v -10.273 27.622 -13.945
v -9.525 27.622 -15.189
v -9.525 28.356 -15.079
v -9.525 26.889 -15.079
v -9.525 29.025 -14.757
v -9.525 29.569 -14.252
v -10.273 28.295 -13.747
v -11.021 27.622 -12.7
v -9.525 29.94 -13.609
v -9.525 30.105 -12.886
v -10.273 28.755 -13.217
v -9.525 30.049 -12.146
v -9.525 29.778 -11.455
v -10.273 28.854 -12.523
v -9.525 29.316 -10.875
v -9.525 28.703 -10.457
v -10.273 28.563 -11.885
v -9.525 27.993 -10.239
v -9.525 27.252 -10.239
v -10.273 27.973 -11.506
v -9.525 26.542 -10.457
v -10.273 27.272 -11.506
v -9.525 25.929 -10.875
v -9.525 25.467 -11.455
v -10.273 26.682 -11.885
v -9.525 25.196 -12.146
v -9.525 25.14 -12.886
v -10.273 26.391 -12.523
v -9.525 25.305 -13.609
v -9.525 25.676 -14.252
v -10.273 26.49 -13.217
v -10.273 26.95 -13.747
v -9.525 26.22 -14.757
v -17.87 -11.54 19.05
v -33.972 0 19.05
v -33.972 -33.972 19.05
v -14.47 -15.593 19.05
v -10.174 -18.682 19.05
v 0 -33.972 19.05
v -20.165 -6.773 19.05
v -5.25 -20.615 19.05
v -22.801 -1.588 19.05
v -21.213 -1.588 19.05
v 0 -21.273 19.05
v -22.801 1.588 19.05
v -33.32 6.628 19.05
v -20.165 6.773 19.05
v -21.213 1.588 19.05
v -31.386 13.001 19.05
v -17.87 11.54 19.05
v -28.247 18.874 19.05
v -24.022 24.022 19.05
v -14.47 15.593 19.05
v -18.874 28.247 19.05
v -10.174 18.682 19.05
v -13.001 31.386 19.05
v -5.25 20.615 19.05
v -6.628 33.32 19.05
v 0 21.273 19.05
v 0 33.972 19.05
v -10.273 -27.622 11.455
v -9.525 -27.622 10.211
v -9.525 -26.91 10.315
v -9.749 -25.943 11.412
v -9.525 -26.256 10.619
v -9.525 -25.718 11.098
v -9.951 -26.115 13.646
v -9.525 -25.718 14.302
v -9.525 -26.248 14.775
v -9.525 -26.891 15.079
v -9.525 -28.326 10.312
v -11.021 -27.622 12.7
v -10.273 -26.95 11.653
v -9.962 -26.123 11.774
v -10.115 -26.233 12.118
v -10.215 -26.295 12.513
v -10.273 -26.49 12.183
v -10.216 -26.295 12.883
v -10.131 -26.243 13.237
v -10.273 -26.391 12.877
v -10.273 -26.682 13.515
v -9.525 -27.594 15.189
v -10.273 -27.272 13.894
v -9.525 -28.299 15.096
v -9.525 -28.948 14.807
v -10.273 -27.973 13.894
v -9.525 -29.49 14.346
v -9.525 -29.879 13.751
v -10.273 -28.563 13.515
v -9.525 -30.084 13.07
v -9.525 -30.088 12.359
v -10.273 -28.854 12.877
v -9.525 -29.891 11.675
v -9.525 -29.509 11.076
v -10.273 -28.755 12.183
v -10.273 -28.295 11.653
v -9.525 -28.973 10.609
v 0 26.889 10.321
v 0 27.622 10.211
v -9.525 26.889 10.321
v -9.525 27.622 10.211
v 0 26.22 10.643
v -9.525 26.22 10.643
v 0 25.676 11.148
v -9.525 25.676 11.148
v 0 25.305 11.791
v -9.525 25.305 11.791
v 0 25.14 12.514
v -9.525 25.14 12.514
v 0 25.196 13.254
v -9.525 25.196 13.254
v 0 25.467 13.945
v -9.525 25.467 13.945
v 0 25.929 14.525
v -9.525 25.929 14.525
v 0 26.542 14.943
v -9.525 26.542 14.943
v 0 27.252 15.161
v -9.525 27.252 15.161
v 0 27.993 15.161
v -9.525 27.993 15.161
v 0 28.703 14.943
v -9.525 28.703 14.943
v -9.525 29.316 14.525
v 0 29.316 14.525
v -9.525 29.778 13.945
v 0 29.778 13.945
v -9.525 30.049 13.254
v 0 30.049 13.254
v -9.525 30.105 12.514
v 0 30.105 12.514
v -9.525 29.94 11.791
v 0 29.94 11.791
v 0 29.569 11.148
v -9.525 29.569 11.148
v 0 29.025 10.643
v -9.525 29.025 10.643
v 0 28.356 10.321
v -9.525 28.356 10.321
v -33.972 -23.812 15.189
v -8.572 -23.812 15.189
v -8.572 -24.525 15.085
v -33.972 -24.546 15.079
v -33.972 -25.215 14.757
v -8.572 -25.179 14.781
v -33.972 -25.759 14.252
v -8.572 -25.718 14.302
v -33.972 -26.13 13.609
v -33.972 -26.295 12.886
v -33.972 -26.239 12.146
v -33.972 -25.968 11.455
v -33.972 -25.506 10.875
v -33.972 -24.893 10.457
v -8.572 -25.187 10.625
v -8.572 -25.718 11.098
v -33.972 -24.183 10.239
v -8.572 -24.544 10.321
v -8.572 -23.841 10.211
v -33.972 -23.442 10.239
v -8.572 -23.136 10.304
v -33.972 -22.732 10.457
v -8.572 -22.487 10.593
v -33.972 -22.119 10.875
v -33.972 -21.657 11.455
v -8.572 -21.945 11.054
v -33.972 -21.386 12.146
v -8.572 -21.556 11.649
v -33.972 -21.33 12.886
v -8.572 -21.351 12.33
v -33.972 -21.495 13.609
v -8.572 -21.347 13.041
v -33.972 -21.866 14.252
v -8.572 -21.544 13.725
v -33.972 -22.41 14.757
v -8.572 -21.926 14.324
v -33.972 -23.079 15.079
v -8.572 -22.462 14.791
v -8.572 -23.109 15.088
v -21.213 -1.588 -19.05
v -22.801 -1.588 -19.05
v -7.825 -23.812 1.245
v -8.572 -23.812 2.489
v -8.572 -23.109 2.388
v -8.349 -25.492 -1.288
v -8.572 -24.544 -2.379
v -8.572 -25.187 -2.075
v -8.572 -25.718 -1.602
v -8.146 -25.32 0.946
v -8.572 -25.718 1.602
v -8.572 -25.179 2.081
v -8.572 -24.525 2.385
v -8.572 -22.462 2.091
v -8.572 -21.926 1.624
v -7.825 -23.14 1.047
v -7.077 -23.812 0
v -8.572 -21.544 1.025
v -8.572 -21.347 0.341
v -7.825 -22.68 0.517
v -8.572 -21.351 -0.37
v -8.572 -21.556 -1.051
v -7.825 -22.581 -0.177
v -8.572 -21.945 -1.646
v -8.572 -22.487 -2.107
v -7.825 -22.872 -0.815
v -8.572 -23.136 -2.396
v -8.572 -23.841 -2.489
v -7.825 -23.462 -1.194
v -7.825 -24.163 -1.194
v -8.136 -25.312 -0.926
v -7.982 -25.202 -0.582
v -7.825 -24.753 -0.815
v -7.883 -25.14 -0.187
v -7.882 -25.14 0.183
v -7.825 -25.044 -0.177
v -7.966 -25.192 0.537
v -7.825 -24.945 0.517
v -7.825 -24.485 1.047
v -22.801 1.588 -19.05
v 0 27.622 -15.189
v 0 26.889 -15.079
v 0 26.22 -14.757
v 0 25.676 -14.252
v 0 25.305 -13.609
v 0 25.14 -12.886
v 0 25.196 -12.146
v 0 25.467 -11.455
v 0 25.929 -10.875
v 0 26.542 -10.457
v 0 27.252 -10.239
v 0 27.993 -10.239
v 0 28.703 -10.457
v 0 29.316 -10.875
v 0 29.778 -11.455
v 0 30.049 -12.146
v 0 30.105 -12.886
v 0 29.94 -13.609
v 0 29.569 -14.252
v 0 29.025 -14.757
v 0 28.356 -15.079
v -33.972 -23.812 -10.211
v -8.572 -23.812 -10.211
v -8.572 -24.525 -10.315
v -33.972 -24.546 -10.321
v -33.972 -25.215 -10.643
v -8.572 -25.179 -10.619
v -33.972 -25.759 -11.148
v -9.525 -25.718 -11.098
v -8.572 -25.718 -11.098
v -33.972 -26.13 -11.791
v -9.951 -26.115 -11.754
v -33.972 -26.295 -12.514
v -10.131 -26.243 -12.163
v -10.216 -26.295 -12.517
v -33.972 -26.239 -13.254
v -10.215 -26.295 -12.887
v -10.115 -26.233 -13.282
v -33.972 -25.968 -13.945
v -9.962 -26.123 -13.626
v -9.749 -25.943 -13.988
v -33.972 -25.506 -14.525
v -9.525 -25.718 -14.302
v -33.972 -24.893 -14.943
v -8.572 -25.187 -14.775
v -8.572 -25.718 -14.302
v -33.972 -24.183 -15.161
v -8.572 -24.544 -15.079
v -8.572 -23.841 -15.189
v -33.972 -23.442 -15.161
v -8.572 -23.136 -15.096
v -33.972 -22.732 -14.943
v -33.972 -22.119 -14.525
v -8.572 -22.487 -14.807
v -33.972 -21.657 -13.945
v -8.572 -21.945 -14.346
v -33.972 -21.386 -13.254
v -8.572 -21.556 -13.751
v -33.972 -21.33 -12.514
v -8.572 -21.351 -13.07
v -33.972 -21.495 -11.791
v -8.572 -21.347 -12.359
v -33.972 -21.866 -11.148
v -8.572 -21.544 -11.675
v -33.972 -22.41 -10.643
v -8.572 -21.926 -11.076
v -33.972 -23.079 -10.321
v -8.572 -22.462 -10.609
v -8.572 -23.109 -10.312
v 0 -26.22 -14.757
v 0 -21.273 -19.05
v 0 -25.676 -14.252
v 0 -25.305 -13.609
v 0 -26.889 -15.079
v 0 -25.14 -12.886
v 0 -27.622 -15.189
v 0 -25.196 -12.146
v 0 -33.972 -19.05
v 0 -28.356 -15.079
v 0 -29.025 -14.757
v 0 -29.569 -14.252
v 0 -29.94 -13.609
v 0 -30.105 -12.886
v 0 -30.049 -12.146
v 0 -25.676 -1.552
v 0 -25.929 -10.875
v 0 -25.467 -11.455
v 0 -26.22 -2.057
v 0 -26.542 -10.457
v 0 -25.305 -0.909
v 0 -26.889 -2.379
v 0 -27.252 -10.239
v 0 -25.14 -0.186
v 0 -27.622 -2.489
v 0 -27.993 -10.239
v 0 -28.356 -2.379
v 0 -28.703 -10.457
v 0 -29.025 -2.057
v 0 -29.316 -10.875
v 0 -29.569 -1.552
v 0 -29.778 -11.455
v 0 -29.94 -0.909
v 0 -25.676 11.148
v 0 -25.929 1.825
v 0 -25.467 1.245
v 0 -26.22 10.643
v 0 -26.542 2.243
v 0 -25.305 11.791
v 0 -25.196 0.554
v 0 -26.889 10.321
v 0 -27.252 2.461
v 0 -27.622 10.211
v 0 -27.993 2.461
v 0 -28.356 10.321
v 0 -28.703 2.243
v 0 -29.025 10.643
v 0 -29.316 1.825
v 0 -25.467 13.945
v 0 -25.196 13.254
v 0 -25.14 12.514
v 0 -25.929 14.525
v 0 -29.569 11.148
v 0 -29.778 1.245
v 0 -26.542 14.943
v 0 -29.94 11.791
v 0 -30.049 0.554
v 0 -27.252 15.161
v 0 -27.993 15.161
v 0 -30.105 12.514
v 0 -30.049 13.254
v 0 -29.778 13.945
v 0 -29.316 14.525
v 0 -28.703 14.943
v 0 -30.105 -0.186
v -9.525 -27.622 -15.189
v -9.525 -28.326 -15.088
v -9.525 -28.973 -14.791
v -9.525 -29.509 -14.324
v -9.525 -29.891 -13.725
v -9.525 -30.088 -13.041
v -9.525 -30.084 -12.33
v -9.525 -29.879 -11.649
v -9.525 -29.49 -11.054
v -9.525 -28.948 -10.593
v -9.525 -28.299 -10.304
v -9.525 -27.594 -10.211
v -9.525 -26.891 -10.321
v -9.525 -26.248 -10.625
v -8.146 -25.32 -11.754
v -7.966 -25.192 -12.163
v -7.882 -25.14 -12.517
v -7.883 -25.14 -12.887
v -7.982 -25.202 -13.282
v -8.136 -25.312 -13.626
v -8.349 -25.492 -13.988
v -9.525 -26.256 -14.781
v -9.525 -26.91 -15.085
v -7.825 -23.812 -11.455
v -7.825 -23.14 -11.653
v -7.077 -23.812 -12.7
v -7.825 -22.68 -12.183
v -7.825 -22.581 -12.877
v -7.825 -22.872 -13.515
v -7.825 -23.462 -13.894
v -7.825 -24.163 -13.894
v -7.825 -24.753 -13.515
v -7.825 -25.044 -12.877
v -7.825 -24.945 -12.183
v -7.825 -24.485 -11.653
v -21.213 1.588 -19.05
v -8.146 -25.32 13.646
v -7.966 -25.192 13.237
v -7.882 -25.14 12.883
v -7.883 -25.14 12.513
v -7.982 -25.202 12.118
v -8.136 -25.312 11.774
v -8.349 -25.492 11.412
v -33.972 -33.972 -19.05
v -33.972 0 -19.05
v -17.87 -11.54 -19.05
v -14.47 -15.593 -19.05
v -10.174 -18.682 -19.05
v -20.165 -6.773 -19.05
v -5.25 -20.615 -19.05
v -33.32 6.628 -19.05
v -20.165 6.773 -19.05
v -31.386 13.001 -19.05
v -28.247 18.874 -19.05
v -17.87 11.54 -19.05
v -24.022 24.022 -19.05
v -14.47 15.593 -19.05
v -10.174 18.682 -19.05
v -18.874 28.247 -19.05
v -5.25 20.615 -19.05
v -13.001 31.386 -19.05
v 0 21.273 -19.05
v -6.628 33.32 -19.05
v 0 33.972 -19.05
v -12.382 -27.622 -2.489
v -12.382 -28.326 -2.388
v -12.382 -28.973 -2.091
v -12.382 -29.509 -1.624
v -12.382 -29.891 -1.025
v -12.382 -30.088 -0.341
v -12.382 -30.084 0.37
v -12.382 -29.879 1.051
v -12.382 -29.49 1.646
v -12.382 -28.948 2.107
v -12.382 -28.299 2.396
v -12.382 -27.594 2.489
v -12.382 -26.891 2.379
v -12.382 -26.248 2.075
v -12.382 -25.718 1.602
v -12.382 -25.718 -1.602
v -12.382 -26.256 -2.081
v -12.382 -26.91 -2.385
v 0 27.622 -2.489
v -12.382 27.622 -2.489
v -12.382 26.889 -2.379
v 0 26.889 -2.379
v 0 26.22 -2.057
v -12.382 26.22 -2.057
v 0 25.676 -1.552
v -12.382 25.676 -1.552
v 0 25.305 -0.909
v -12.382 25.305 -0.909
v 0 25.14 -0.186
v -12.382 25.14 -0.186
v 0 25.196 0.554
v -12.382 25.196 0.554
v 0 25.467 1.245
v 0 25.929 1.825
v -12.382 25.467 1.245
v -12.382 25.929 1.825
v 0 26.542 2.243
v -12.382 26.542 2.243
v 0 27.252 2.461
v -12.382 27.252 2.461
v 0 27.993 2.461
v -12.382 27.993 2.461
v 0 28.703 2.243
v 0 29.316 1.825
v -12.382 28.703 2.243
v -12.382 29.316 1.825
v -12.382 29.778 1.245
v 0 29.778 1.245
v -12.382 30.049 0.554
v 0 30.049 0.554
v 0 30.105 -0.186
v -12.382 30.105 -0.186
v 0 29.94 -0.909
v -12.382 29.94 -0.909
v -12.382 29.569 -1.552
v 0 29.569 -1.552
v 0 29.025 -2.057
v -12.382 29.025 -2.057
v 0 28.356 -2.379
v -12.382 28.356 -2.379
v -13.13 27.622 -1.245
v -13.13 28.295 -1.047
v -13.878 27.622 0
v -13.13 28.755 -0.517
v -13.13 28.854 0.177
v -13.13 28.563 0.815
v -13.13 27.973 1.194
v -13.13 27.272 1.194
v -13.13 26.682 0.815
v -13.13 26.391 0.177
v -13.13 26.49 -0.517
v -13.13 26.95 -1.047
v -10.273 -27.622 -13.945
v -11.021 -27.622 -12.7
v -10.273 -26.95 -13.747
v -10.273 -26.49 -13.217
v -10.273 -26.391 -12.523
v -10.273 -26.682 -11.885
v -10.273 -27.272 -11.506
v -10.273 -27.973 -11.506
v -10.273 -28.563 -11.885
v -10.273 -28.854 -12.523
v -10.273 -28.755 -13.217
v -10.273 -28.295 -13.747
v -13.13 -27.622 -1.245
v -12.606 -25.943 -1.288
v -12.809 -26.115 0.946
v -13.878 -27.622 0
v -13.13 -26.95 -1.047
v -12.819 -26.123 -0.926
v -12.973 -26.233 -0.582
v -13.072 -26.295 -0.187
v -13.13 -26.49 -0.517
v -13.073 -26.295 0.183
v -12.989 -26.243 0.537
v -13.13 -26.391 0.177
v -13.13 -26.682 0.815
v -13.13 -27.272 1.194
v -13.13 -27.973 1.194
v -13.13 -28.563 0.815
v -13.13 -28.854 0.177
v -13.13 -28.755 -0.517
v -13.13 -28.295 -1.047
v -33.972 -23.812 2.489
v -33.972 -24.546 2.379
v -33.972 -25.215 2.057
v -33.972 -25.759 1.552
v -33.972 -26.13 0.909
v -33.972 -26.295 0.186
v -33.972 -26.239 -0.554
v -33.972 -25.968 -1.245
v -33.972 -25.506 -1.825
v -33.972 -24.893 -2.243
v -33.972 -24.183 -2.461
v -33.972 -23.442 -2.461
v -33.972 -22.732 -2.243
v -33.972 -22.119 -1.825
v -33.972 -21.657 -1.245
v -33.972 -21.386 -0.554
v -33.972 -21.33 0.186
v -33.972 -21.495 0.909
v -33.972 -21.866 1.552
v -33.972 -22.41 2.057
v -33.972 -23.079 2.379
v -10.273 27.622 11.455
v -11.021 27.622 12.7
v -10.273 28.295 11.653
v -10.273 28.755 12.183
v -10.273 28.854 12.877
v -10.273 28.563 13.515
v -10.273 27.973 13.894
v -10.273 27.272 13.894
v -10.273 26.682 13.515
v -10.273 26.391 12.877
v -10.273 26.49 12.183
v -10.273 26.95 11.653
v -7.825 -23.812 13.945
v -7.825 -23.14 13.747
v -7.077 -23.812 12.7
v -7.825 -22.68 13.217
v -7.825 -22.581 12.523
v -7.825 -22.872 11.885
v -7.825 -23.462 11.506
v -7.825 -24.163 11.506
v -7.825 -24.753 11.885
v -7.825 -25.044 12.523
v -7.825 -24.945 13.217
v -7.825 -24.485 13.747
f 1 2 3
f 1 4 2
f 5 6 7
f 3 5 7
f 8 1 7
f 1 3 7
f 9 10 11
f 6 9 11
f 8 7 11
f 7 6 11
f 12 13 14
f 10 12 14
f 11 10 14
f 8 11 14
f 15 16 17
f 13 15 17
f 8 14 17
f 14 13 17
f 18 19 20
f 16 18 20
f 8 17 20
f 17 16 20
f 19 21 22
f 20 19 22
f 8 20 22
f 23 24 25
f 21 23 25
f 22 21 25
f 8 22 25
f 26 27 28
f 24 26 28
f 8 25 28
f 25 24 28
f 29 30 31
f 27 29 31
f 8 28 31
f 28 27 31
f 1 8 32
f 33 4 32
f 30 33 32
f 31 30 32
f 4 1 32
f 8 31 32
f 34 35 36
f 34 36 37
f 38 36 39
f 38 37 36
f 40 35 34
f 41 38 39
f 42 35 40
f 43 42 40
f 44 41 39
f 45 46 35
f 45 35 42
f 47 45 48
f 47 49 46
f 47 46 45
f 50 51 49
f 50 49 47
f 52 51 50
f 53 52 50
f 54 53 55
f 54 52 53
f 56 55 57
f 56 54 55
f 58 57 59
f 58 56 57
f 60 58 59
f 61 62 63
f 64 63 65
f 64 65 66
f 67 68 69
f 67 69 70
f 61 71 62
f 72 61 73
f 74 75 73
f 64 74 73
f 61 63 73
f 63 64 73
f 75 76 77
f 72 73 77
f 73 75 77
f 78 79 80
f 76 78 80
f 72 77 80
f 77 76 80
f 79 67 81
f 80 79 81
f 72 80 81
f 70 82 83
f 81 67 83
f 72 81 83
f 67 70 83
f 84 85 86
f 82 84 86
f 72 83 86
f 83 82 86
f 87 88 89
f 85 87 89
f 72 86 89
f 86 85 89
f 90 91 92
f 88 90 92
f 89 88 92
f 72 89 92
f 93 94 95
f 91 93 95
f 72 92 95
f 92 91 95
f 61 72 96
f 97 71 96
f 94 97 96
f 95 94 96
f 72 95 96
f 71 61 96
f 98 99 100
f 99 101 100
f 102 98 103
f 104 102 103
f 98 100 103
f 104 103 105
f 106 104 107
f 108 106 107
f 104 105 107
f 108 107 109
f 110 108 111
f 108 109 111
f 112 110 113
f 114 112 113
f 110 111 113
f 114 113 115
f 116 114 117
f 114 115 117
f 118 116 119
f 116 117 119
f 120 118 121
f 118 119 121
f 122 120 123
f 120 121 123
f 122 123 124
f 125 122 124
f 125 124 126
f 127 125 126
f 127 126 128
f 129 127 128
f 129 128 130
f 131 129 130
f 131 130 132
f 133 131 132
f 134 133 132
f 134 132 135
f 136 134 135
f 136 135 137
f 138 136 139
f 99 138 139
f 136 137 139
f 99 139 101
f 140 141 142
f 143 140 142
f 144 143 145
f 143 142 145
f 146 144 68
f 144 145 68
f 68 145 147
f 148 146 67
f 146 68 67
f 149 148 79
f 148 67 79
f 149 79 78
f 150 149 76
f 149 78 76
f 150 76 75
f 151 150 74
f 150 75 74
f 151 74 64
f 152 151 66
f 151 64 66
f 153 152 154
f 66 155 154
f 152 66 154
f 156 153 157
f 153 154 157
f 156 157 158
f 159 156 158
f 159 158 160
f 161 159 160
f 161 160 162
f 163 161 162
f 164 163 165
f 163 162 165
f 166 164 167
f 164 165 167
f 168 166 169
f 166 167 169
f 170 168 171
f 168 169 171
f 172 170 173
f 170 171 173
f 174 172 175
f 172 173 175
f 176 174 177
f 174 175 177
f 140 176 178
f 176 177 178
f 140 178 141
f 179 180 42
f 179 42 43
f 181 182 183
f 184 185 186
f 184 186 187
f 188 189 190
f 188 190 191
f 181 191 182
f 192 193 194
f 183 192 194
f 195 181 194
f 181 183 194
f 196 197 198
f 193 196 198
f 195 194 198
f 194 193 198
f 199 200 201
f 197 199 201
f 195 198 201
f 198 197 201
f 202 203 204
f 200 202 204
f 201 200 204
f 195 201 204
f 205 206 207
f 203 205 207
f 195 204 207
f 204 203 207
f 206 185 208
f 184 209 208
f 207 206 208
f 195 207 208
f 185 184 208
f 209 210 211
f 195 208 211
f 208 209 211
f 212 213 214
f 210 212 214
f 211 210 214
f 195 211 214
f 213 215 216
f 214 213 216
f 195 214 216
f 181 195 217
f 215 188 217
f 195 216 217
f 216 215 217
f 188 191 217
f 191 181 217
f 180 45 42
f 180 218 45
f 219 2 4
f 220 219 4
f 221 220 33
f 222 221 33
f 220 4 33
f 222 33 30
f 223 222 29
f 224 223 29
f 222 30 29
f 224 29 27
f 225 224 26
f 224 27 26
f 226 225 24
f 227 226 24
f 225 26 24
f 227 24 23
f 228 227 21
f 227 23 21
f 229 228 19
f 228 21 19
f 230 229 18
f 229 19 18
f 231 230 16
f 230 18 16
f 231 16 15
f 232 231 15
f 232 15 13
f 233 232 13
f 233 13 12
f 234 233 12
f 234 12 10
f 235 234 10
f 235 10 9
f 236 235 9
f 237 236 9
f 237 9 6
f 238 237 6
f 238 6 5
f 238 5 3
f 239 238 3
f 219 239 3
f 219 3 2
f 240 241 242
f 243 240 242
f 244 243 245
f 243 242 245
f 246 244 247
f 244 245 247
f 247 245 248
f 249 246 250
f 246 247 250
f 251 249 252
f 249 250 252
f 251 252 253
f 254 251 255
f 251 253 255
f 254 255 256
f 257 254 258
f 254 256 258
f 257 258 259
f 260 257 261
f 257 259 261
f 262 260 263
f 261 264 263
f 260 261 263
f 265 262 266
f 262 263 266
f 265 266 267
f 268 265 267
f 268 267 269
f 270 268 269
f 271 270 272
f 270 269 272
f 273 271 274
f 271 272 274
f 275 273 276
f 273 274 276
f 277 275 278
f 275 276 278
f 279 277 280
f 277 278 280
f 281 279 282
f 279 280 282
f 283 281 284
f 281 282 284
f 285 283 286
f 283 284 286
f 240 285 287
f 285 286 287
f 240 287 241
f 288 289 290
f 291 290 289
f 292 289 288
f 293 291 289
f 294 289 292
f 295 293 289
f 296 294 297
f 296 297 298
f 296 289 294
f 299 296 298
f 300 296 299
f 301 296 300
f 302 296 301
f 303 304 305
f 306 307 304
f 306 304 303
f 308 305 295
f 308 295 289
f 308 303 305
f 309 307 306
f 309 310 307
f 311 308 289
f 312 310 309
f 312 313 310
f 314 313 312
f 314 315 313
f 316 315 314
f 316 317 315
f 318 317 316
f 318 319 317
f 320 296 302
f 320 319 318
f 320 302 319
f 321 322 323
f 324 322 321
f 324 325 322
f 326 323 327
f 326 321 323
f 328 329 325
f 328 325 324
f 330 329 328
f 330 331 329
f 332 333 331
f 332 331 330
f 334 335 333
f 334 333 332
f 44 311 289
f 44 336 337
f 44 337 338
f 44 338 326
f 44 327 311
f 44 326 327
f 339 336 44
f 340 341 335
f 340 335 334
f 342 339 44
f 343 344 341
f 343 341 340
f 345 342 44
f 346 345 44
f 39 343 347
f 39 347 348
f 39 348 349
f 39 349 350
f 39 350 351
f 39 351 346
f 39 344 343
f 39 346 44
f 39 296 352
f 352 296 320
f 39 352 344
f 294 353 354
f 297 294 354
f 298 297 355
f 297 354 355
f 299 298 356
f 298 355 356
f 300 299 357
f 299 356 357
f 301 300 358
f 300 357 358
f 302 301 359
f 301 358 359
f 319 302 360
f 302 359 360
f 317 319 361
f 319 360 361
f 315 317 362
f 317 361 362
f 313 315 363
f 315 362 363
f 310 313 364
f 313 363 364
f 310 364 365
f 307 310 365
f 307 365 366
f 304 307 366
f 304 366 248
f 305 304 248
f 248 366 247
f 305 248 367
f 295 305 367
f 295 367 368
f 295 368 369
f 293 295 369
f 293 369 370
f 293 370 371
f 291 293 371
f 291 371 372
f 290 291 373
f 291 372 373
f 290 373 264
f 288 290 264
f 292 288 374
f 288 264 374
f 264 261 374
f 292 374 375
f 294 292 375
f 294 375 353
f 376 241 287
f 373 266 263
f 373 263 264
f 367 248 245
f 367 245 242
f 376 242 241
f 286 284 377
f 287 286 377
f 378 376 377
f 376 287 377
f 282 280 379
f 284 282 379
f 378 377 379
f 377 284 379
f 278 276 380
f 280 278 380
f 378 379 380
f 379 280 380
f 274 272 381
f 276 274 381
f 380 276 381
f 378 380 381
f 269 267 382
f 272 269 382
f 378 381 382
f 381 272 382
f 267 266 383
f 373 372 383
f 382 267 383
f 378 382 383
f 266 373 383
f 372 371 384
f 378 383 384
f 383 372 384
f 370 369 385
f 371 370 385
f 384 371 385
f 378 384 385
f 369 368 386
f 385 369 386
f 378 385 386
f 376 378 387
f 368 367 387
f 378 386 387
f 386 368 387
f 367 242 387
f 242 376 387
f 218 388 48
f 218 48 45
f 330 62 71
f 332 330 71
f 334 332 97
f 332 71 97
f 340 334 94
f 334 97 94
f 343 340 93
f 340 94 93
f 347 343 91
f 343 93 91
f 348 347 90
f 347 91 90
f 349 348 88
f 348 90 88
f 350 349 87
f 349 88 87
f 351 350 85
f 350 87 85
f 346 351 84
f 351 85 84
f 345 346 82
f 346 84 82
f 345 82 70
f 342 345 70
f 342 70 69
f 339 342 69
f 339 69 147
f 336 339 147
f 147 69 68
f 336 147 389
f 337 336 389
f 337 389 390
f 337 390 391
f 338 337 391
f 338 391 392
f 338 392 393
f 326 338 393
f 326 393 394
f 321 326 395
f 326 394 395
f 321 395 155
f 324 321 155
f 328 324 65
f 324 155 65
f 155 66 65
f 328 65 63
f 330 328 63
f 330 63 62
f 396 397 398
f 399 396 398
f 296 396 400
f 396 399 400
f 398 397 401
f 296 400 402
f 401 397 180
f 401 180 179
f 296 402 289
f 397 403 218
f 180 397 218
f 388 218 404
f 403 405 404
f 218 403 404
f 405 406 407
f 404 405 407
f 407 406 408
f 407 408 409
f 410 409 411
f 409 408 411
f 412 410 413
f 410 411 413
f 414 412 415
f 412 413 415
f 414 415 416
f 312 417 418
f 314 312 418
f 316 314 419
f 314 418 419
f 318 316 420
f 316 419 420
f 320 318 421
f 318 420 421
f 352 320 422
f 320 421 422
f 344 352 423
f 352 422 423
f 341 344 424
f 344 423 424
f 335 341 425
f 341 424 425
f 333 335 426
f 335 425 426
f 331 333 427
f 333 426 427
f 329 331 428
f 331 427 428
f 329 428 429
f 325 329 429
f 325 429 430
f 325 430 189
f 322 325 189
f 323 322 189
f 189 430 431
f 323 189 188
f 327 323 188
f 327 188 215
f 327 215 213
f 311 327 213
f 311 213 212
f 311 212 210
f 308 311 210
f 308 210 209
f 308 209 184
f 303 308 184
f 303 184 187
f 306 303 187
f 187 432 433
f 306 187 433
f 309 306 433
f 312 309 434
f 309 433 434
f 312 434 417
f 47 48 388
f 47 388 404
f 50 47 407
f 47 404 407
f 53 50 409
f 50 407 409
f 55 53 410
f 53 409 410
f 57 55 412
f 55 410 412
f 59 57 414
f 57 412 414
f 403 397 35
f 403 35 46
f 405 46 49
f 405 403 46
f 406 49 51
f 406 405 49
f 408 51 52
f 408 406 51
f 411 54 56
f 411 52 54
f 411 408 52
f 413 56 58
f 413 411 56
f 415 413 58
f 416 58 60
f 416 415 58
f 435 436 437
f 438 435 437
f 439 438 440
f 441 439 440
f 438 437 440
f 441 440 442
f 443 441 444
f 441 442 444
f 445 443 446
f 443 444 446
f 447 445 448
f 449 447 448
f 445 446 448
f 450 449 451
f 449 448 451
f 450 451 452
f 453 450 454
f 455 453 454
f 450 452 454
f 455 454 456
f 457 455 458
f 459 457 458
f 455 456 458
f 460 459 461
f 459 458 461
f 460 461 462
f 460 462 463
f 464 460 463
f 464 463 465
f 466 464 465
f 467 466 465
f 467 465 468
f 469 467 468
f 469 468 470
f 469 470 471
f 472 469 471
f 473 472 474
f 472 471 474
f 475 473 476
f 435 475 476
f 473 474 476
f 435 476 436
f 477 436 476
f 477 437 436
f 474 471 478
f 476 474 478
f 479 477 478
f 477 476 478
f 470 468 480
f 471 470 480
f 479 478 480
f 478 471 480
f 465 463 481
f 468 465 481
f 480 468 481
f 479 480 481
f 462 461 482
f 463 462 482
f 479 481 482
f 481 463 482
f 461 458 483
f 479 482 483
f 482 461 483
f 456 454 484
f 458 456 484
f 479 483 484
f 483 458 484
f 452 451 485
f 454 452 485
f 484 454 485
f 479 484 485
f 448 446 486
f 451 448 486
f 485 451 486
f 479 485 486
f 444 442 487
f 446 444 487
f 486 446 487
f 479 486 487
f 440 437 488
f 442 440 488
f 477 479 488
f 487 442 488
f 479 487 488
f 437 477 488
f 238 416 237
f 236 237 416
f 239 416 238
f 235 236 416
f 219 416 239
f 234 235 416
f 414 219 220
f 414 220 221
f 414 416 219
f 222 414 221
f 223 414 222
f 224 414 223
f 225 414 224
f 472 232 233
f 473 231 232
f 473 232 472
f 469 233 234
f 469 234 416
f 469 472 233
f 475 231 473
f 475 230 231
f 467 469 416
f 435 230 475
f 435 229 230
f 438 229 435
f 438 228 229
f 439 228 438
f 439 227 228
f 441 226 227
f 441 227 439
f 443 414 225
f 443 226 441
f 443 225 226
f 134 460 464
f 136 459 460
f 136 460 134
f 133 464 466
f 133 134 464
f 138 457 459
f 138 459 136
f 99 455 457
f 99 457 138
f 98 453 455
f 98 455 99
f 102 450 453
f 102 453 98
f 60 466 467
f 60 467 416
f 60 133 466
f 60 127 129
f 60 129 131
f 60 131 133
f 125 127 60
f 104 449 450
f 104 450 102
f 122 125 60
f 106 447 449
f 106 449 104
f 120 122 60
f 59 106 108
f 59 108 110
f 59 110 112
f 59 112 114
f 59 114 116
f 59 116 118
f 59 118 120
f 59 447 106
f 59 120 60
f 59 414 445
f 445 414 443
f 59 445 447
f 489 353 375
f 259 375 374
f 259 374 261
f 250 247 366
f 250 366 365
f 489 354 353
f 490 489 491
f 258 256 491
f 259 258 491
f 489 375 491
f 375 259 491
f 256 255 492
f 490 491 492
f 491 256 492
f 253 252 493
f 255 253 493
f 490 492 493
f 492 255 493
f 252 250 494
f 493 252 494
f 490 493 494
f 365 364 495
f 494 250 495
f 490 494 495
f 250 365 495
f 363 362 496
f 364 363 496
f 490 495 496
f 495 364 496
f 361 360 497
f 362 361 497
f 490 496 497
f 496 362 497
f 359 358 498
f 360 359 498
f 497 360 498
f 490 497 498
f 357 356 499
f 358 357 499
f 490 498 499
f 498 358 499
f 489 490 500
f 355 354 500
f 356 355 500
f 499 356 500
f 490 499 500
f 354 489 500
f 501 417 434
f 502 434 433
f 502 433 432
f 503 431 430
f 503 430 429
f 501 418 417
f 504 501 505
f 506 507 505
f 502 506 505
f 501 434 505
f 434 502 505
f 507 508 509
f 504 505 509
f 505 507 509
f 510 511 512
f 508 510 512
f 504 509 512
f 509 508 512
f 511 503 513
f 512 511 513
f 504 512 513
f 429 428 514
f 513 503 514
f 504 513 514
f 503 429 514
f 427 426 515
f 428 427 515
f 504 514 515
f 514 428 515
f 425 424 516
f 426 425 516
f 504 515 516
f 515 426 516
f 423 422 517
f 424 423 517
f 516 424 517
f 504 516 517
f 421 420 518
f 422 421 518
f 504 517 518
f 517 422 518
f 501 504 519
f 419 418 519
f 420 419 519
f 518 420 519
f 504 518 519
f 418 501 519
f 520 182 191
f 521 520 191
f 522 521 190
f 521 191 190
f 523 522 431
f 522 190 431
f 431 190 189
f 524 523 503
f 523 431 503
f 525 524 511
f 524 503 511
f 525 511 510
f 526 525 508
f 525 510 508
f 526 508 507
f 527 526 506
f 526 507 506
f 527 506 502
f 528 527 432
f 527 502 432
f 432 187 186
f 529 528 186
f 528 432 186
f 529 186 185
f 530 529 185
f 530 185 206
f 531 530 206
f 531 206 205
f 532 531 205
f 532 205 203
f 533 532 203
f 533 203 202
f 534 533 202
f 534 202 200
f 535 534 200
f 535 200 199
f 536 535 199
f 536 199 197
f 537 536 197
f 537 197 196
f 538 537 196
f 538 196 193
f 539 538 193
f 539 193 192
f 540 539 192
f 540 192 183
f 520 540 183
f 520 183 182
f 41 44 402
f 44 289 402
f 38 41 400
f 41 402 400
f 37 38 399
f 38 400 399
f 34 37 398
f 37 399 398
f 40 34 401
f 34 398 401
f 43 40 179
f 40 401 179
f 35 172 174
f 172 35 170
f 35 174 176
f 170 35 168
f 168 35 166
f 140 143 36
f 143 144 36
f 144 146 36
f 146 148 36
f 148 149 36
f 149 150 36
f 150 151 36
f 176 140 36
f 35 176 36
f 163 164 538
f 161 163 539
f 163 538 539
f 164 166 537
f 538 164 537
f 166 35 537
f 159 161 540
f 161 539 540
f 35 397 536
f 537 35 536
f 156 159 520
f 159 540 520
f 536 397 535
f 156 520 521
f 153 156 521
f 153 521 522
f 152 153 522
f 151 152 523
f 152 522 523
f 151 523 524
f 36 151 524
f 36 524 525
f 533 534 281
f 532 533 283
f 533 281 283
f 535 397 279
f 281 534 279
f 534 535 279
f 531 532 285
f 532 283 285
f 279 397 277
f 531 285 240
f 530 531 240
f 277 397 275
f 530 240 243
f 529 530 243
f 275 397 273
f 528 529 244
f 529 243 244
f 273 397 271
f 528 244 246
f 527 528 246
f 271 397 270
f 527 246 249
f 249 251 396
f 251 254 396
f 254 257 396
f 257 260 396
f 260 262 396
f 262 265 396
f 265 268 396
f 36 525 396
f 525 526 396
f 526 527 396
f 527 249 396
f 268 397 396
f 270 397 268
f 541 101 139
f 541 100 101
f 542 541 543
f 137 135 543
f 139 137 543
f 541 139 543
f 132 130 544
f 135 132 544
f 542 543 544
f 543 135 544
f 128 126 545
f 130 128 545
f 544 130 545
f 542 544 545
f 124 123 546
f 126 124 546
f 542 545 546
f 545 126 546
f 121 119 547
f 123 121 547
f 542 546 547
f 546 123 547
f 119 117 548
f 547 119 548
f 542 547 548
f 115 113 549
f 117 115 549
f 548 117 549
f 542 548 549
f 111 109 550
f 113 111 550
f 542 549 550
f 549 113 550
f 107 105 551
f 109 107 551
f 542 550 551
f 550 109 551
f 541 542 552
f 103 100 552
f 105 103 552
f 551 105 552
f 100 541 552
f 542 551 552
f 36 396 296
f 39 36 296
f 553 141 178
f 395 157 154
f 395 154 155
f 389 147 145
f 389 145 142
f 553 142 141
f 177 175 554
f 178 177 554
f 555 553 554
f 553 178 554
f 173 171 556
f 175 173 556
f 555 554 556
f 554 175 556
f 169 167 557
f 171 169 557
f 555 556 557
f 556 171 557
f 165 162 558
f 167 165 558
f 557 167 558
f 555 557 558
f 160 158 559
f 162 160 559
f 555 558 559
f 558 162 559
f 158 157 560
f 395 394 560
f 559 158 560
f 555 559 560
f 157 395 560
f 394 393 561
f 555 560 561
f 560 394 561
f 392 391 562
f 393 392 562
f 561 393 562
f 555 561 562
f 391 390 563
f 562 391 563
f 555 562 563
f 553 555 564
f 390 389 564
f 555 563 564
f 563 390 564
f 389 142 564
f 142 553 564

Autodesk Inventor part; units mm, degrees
ref_plane "YZ Plane" through (0, 0, 0) normal (1, 0, 0) x (0, 1, 0)
ref_plane "XZ Plane" through (0, 0, 0) normal (0, 1, 0) x (-1, 0, 0)
ref_plane "XY Plane" through (0, 0, 0) normal (0, 0, 1) x (1, 0, 0)
sketch "Sketch1" plane through (0, 0, 0) normal (0, 0, 1) x (1, 0, 0)
  arc A0 (-21.2132, -1.5875) -> (-21.2132, 1.5875) centre (0, 0) ccw
  arc A1 (0, 33.9725) -> (-33.9725, 0) centre (0, 0) ccw
  line L0 (0, -33.9725) -> (-33.9725, -33.9725)
  line L1 (-33.9725, 0) -> (-33.9725, -33.9725)
  line L2 (0, 33.9725) -> (33.9725, 33.9725)
  line L3 (0, -33.9725) -> (33.9725, -33.9725)
  line L4 (33.9725, 0) -> (33.9725, -33.9725)
  line L5 (33.9725, 0) -> (33.9725, 33.9725)
  line L6 (0, 0) -> (-21.2655, 0) construction
  line L7 (-21.2132, 1.5875) -> (-22.8007, 1.5875)
  line L8 (-22.8007, 1.5875) -> (-22.8007, -1.5875)
  line L9 (-22.8007, -1.5875) -> (-21.2132, -1.5875)
  dimension "d0" = 42.545
  dimension "d1" = 67.945
  dimension "d29" = 1.5875
  dimension "d30" = 1.5875
  dimension "d31" = 1.5875
extrude "Extrusion1" add sketch "Sketch1" along normal mid plane 38.1
sketch "Sketch3" plane through (33.9725, -33.9725, 19.05) normal (1, 0, 0) x (0, 0, -1)
  line L0 (0, 67.945) -> (38.1, 67.945) construction
  line L1 (19.05, 67.945) -> (19.05, 0) construction
  line L2 (0, 0) -> (38.1, 0) construction
  point P0 (19.05, 33.9725)
  point P1 (19.05, 61.595)
  point P2 (19.05, 6.35)
  dimension "d13" = 6.35
  dimension "d14" = 6.35
split "Split1" plane through (0, 0, 0) removes the side toward (1, 0, 0)
sketch "Sketch4" plane through (0, 21.2725, -19.05) normal (1, 0, 0) x (0, 0, -1)
  point P0 (-19.05, -21.2725)
hole "Hole3" at (33.9725, 27.6225, 0) at (33.9725, -27.6225, 0) direction (-1, 0, 0) diameter 4.9784 depth 46.355 tip angle 118 thread size "1/4-20 UNC" class "2B" standard "ANSI Unified Screw Threads"
sketch "Sketch5" plane through (-33.9725, -33.9725, 19.05) normal (-1, 0, 0) x (0, 0, 1)
  line L0 (0, 0) -> (-38.1, 0) construction
  line L1 (-31.75, 0) -> (-31.75, 33.9725) construction
  line L2 (-6.35, 0) -> (-6.35, 33.9725) construction
  line L3 (0, 33.9725) -> (-38.1, 33.9725) construction
  line L4 (-38.1, 0) -> (-38.1, 33.9725) construction
  line L5 (0, 33.9725) -> (0, 0) construction
  line L6 (-19.05, 33.9725) -> (-19.05, 0) construction
  point P0 (-31.75, 10.16)
  point P1 (-6.35, 10.16)
  point P2 (-19.05, 10.16)
  dimension "d32" = 6.35
  dimension "d33" = 6.35
  dimension "d34" = 10.16
  dimension "d35" = 10.16
sketch "Sketch6" plane through (0, -33.9725, 19.05) normal (1, 0, 0) x (0, 0, -1)
  line L0 (0, 67.945) -> (38.1, 67.945) construction
  line L1 (6.35, 67.945) -> (6.35, 0) construction
  line L2 (0, 0) -> (38.1, 0) construction
  line L3 (31.75, 67.945) -> (31.75, 0) construction
  line L4 (0, 0) -> (0, 12.7) construction
  line L5 (38.1, 12.7) -> (38.1, 0) construction
  point P0 (19.05, 33.9725)
  point P1 (6.35, 6.35)
  point P2 (6.35, 61.595)
  point P3 (31.75, 61.595)
  point P4 (31.75, 6.35)
  dimension "d36" = 6.35
  dimension "d37" = 6.35
  dimension "d38" = 6.35
  dimension "d39" = 6.35
hole "Hole4" at (-33.9725, -23.8125, -12.7) at (-33.9725, -23.8125, 0) at (-33.9725, -23.8125, 12.7) direction (1, 0, 0) diameter 4.9784 depth 25.4 tip angle 118 thread size "1/4-20 UNC" class "2B" standard "ANSI Unified Screw Threads"
hole "Hole5" at (0, 27.6225, 12.7) at (0, 27.6225, -12.7) at (0, -27.6225, -12.7) at (0, -27.6225, 12.7) direction (-1, 0, 0) diameter 4.9784 depth 9.525 tip angle 118 thread size "1/4-20 UNC" class "2B" standard "ANSI Unified Screw Threads"
equation "\"d0\" = pipeDiameter"
equation "\"d1\" = pipeDiameter + 2 * outerRadius"
equation "\"d2\" = width"
equation "\"pipeDiameter\" = 42.545"
equation "\"outerRadius\" = 12.7"
equation "\"width\" = 38.1"
properties part number "gripperBracketA" material "Aluminum 6061"
